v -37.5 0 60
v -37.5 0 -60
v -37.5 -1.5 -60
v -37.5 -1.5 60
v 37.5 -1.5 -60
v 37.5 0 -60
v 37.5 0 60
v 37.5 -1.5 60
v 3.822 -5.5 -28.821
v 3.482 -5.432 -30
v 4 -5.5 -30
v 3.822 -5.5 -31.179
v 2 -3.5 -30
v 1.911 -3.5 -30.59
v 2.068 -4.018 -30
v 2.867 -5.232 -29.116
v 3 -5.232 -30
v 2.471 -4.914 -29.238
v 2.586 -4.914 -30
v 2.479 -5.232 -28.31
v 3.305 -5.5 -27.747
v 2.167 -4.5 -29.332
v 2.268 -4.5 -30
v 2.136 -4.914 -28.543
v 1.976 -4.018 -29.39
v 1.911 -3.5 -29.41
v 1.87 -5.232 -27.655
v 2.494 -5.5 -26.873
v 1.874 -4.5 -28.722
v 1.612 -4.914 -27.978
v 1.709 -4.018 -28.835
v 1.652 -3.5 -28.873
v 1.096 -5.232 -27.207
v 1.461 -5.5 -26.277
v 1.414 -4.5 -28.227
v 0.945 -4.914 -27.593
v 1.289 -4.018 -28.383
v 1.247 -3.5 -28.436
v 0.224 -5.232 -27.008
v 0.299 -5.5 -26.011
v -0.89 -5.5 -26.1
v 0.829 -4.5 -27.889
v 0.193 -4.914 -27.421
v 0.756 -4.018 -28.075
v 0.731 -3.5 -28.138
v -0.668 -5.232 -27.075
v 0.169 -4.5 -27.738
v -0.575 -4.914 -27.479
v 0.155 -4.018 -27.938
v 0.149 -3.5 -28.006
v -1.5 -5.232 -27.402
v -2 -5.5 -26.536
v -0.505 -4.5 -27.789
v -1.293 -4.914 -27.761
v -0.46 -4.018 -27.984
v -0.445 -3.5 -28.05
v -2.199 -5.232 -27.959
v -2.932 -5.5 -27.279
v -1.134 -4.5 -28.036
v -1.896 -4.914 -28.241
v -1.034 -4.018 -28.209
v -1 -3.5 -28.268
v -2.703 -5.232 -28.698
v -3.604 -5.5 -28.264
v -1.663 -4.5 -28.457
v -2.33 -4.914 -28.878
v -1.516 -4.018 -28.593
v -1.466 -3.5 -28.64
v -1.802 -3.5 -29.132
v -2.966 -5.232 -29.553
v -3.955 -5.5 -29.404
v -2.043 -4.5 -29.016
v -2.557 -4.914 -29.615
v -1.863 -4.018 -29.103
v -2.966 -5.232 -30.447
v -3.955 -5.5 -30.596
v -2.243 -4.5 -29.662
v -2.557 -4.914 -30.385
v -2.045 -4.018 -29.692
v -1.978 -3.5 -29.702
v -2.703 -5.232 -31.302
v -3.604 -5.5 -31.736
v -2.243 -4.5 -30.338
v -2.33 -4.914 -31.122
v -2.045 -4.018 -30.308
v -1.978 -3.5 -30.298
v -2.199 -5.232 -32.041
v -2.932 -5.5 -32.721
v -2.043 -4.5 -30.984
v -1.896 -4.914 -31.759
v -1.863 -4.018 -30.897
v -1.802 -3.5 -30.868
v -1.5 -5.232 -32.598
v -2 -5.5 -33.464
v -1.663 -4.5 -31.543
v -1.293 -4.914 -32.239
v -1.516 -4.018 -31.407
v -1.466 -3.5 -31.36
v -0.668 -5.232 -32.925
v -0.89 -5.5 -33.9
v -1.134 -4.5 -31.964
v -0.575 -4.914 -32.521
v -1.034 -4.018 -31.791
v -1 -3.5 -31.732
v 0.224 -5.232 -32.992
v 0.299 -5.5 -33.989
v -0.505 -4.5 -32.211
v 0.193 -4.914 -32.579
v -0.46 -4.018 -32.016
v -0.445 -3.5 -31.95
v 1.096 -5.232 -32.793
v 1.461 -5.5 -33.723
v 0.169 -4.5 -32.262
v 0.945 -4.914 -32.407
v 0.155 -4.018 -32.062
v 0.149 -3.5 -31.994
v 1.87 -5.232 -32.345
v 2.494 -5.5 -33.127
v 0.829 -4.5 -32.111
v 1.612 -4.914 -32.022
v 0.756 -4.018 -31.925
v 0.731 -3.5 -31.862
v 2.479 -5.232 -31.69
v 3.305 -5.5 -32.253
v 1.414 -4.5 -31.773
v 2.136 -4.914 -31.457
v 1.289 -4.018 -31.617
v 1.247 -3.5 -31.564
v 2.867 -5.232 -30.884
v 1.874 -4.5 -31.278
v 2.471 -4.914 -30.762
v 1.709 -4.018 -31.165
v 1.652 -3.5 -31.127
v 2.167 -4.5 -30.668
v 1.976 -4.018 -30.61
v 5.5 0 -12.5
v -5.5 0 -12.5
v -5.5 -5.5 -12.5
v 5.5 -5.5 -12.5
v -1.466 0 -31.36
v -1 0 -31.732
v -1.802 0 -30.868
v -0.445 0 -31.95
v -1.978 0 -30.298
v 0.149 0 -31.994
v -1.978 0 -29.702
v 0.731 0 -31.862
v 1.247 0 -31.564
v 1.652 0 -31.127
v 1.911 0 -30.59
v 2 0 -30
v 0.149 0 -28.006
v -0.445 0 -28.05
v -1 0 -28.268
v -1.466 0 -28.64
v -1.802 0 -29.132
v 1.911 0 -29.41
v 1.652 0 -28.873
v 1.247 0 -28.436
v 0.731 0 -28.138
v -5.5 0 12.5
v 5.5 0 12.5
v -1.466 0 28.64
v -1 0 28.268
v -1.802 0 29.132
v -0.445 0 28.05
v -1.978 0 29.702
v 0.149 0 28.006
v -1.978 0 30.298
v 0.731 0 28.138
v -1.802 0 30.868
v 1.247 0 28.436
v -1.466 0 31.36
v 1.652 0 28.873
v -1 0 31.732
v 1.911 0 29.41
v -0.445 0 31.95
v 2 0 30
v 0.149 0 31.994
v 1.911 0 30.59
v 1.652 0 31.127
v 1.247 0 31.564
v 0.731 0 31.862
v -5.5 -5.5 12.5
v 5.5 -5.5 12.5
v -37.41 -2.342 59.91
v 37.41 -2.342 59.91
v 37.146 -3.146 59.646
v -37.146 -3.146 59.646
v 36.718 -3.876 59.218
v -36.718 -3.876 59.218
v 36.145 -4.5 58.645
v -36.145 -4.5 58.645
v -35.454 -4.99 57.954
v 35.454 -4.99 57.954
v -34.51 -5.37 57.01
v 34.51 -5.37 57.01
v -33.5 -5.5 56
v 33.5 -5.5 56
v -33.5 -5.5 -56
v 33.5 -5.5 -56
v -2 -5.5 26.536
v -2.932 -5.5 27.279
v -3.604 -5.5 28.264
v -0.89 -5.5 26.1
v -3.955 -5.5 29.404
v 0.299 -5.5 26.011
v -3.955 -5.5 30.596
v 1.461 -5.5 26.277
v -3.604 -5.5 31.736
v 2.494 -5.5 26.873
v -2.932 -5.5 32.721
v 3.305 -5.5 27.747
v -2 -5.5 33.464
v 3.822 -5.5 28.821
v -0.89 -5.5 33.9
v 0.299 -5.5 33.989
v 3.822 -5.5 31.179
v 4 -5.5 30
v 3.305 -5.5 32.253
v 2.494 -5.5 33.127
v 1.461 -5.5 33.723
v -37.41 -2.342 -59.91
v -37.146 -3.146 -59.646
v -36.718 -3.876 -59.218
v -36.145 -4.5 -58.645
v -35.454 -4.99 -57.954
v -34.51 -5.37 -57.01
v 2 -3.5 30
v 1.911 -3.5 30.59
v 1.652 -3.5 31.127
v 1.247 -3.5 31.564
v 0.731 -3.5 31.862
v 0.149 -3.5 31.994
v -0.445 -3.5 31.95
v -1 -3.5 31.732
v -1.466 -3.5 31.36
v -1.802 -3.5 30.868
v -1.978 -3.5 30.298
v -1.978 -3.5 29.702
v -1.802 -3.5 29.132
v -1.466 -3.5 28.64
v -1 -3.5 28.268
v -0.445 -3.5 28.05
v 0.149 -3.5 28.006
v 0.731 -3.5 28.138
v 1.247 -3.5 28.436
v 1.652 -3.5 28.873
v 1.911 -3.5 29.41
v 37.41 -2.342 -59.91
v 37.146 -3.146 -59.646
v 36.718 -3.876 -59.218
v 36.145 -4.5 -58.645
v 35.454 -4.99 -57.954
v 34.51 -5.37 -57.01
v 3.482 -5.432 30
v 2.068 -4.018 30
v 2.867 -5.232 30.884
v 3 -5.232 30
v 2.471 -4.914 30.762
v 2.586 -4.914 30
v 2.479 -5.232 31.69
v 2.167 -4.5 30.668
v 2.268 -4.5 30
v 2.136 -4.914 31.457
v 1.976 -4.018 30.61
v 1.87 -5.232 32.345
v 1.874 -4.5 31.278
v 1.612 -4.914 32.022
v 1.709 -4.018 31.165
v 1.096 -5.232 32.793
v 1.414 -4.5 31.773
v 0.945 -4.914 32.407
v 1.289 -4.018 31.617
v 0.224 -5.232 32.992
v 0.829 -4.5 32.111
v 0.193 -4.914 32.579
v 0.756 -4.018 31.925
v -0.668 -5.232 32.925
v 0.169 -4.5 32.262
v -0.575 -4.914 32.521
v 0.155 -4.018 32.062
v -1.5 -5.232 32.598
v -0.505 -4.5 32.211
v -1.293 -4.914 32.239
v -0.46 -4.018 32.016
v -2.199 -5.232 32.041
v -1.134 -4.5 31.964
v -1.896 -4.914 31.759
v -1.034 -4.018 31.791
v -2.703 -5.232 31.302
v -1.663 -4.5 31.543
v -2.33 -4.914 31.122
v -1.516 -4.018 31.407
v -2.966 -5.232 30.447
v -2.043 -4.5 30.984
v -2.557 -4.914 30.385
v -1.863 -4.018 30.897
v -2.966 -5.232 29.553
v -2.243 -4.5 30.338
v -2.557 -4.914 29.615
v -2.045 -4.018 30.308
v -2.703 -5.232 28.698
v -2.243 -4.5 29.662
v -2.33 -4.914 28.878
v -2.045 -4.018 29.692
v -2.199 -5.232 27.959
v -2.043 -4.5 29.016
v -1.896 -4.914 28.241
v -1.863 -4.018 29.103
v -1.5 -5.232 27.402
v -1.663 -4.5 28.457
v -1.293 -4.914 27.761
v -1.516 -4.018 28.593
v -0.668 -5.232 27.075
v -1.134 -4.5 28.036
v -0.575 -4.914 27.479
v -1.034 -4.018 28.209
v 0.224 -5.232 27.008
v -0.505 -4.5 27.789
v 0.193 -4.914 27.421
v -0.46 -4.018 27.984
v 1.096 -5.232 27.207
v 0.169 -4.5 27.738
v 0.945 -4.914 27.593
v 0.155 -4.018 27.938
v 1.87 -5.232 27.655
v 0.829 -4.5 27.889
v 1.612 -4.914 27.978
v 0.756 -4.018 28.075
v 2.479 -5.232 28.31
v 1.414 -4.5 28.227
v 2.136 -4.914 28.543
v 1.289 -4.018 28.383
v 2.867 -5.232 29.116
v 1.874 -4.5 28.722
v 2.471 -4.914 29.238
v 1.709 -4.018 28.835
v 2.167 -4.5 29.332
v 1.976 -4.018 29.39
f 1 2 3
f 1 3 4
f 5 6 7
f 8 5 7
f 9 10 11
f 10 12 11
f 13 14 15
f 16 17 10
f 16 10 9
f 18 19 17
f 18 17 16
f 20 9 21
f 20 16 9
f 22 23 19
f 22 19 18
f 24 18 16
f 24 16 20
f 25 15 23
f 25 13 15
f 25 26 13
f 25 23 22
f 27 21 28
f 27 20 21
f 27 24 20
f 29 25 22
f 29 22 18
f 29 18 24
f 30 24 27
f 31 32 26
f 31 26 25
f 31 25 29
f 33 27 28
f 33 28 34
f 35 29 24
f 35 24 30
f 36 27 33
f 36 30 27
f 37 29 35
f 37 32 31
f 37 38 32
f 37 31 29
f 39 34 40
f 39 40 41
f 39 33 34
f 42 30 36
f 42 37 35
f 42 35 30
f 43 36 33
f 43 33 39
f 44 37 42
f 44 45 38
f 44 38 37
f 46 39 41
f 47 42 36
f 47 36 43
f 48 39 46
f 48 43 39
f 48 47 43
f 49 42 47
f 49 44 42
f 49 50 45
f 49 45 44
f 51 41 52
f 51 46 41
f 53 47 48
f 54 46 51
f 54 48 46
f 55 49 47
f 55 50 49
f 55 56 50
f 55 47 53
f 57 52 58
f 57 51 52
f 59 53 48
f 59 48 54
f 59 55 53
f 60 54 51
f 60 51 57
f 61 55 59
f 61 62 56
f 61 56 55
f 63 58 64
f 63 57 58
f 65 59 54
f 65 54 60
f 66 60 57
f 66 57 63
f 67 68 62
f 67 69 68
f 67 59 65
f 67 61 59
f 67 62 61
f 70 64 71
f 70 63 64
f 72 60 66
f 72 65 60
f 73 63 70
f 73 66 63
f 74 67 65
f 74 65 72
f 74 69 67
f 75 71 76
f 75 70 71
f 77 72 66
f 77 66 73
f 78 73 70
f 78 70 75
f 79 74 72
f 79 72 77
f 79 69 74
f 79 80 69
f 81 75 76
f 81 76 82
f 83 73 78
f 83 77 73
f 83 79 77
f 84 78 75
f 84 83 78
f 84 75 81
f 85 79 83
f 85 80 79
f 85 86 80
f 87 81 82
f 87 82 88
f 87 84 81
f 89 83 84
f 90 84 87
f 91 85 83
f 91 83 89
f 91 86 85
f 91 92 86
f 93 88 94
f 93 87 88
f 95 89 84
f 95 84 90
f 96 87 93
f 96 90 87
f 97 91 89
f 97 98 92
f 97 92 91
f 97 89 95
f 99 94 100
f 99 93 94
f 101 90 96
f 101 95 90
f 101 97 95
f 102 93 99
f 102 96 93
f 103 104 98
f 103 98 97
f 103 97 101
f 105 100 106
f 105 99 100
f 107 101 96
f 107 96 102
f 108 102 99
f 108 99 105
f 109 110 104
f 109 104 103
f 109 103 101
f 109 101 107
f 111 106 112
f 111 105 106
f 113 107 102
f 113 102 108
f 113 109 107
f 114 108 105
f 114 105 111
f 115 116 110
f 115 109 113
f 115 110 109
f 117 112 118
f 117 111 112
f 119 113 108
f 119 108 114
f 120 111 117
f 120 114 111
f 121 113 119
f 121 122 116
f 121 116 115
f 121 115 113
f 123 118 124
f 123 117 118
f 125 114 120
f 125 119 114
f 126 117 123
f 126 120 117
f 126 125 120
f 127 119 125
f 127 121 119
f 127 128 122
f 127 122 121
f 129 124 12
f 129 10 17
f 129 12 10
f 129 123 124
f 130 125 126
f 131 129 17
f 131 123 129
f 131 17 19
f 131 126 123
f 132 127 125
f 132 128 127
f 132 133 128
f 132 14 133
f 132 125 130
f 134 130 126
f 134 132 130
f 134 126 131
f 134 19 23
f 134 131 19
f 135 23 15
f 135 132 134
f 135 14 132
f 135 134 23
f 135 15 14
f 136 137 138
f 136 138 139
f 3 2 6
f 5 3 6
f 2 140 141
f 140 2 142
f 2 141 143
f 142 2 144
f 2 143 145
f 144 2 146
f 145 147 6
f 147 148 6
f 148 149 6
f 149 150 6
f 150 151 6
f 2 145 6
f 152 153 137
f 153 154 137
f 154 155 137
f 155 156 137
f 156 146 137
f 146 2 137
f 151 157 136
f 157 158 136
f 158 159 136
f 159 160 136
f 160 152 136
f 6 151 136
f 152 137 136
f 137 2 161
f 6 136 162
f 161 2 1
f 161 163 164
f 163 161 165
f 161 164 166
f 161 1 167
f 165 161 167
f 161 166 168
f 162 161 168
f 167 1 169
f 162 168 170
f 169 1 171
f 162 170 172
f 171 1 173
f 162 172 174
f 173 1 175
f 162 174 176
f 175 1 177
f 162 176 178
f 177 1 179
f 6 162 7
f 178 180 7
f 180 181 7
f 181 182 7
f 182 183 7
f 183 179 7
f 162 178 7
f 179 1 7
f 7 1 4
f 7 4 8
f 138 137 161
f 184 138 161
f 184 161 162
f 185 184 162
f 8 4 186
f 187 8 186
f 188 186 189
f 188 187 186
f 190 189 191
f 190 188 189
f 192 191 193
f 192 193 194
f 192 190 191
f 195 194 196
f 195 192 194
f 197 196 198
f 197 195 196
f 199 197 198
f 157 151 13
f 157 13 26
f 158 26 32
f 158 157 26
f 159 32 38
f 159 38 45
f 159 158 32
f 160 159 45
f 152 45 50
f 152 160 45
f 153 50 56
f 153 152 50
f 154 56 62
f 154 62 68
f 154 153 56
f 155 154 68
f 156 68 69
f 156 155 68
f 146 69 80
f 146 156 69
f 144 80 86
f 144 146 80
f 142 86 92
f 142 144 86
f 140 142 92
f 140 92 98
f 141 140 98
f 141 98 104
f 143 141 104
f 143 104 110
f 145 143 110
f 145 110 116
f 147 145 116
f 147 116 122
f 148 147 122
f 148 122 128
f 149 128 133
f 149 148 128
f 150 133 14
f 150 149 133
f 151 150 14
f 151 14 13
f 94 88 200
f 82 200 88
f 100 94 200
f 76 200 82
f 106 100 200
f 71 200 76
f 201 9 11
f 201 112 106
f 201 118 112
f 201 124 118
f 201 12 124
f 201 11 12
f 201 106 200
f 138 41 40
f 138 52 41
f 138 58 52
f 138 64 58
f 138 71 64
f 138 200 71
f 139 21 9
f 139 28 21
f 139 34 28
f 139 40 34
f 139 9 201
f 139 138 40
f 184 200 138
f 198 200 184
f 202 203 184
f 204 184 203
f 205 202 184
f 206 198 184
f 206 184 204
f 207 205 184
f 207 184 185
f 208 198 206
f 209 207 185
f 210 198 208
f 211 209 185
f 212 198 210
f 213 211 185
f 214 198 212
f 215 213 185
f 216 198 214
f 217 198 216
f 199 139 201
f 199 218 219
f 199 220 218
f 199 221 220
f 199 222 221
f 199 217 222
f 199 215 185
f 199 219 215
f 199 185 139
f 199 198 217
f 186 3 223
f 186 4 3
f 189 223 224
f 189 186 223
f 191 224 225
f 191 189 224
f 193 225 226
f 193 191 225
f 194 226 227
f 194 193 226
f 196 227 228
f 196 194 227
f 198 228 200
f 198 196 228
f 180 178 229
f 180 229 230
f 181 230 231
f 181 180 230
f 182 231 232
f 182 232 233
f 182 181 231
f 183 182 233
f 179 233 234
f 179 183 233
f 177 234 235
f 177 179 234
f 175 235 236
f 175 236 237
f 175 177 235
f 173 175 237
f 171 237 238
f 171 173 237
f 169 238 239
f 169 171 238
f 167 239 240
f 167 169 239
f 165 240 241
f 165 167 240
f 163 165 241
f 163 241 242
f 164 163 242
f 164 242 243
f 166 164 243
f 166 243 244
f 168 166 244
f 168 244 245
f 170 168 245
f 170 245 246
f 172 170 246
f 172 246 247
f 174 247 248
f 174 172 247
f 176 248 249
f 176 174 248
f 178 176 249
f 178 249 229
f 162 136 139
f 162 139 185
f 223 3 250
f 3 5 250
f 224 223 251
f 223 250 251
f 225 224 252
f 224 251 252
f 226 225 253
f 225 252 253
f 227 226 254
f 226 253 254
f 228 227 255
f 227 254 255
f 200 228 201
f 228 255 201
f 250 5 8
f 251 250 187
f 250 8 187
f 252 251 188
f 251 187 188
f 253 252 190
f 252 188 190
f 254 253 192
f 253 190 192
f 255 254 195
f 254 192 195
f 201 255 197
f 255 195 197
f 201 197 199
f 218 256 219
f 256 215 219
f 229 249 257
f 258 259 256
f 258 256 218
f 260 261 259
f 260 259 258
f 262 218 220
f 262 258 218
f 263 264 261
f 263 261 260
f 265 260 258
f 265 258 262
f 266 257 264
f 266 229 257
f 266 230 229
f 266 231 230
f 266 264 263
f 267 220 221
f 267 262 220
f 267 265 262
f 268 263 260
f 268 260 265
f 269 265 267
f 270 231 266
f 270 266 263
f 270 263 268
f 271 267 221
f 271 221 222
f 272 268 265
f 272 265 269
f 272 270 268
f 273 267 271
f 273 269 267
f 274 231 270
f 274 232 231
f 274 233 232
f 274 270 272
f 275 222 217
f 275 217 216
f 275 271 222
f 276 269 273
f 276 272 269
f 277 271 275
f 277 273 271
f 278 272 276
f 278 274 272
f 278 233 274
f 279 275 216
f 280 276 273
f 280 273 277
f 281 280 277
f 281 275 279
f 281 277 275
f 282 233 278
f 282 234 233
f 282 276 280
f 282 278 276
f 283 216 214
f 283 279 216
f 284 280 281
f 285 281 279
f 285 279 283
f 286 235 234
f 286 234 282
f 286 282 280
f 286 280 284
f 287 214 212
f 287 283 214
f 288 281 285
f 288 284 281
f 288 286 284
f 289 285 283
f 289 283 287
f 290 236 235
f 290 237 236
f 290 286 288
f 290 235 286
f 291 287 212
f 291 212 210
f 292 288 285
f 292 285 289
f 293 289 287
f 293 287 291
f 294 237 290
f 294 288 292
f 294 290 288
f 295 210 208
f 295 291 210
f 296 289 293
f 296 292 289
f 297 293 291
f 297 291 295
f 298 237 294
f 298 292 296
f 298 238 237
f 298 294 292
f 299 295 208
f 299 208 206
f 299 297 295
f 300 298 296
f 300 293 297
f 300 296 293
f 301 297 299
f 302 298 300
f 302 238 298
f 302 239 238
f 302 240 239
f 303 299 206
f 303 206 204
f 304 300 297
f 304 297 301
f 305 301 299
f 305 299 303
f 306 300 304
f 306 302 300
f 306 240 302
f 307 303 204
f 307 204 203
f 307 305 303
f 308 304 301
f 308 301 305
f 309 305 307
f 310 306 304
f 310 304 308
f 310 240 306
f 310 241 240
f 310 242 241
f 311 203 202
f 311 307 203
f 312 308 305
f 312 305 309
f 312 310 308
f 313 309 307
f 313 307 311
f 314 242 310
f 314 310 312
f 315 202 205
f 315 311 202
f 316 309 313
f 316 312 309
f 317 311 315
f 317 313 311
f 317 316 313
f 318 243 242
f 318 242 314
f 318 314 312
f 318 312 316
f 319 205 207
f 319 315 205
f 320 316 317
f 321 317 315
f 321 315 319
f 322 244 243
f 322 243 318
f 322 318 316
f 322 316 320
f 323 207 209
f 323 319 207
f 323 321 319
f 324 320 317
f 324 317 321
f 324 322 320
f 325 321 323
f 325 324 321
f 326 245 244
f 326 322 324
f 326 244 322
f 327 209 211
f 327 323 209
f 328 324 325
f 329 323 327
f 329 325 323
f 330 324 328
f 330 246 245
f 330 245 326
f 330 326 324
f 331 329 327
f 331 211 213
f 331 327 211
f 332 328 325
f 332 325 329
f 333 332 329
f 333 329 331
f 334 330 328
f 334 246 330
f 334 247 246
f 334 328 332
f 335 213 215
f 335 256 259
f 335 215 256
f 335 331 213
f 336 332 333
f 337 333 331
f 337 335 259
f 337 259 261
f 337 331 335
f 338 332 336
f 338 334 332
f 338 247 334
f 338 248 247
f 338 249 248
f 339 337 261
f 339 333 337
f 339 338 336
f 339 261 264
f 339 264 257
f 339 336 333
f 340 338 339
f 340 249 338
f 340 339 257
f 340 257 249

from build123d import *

# Parameters (mm, degrees)
F0_W     = 75
F0_H     = 120
F0_R     = 2
F0_W_2   = 11
F0_H_2   = 25
F1_DEPTH = 5.5
F2_R     = 4
F3_R     = 2


with BuildPart() as f1:
    # F0 (on Front) → F1 (new body)
    with BuildSketch(Plane.XZ):
        Rectangle(F0_W, F0_H)
        with Locations((0, -30)):
            Circle(F0_R, mode=Mode.SUBTRACT)
        Rectangle(F0_W_2, F0_H_2, mode=Mode.SUBTRACT)
        with Locations((0, 30)):
            Circle(F0_R, mode=Mode.SUBTRACT)
    extrude(amount=F1_DEPTH)

    # F2
    f2_edges = [f1.edges().sort_by_distance(p)[0] for p in [
        (-37.5, -5.5, 0),
        (0, -5.5, 60),
        (37.5, -5.5, 0),
        (0, -5.5, -60),
    ]]
    fillet(f2_edges, radius=F2_R)

    # F3
    f3_edges = [f1.edges().sort_by_distance(p)[0] for p in [
        (-2, -5.5, 30),
        (-2, -5.5, -30),
    ]]
    fillet(f3_edges, radius=F3_R)


solid = f1.part
